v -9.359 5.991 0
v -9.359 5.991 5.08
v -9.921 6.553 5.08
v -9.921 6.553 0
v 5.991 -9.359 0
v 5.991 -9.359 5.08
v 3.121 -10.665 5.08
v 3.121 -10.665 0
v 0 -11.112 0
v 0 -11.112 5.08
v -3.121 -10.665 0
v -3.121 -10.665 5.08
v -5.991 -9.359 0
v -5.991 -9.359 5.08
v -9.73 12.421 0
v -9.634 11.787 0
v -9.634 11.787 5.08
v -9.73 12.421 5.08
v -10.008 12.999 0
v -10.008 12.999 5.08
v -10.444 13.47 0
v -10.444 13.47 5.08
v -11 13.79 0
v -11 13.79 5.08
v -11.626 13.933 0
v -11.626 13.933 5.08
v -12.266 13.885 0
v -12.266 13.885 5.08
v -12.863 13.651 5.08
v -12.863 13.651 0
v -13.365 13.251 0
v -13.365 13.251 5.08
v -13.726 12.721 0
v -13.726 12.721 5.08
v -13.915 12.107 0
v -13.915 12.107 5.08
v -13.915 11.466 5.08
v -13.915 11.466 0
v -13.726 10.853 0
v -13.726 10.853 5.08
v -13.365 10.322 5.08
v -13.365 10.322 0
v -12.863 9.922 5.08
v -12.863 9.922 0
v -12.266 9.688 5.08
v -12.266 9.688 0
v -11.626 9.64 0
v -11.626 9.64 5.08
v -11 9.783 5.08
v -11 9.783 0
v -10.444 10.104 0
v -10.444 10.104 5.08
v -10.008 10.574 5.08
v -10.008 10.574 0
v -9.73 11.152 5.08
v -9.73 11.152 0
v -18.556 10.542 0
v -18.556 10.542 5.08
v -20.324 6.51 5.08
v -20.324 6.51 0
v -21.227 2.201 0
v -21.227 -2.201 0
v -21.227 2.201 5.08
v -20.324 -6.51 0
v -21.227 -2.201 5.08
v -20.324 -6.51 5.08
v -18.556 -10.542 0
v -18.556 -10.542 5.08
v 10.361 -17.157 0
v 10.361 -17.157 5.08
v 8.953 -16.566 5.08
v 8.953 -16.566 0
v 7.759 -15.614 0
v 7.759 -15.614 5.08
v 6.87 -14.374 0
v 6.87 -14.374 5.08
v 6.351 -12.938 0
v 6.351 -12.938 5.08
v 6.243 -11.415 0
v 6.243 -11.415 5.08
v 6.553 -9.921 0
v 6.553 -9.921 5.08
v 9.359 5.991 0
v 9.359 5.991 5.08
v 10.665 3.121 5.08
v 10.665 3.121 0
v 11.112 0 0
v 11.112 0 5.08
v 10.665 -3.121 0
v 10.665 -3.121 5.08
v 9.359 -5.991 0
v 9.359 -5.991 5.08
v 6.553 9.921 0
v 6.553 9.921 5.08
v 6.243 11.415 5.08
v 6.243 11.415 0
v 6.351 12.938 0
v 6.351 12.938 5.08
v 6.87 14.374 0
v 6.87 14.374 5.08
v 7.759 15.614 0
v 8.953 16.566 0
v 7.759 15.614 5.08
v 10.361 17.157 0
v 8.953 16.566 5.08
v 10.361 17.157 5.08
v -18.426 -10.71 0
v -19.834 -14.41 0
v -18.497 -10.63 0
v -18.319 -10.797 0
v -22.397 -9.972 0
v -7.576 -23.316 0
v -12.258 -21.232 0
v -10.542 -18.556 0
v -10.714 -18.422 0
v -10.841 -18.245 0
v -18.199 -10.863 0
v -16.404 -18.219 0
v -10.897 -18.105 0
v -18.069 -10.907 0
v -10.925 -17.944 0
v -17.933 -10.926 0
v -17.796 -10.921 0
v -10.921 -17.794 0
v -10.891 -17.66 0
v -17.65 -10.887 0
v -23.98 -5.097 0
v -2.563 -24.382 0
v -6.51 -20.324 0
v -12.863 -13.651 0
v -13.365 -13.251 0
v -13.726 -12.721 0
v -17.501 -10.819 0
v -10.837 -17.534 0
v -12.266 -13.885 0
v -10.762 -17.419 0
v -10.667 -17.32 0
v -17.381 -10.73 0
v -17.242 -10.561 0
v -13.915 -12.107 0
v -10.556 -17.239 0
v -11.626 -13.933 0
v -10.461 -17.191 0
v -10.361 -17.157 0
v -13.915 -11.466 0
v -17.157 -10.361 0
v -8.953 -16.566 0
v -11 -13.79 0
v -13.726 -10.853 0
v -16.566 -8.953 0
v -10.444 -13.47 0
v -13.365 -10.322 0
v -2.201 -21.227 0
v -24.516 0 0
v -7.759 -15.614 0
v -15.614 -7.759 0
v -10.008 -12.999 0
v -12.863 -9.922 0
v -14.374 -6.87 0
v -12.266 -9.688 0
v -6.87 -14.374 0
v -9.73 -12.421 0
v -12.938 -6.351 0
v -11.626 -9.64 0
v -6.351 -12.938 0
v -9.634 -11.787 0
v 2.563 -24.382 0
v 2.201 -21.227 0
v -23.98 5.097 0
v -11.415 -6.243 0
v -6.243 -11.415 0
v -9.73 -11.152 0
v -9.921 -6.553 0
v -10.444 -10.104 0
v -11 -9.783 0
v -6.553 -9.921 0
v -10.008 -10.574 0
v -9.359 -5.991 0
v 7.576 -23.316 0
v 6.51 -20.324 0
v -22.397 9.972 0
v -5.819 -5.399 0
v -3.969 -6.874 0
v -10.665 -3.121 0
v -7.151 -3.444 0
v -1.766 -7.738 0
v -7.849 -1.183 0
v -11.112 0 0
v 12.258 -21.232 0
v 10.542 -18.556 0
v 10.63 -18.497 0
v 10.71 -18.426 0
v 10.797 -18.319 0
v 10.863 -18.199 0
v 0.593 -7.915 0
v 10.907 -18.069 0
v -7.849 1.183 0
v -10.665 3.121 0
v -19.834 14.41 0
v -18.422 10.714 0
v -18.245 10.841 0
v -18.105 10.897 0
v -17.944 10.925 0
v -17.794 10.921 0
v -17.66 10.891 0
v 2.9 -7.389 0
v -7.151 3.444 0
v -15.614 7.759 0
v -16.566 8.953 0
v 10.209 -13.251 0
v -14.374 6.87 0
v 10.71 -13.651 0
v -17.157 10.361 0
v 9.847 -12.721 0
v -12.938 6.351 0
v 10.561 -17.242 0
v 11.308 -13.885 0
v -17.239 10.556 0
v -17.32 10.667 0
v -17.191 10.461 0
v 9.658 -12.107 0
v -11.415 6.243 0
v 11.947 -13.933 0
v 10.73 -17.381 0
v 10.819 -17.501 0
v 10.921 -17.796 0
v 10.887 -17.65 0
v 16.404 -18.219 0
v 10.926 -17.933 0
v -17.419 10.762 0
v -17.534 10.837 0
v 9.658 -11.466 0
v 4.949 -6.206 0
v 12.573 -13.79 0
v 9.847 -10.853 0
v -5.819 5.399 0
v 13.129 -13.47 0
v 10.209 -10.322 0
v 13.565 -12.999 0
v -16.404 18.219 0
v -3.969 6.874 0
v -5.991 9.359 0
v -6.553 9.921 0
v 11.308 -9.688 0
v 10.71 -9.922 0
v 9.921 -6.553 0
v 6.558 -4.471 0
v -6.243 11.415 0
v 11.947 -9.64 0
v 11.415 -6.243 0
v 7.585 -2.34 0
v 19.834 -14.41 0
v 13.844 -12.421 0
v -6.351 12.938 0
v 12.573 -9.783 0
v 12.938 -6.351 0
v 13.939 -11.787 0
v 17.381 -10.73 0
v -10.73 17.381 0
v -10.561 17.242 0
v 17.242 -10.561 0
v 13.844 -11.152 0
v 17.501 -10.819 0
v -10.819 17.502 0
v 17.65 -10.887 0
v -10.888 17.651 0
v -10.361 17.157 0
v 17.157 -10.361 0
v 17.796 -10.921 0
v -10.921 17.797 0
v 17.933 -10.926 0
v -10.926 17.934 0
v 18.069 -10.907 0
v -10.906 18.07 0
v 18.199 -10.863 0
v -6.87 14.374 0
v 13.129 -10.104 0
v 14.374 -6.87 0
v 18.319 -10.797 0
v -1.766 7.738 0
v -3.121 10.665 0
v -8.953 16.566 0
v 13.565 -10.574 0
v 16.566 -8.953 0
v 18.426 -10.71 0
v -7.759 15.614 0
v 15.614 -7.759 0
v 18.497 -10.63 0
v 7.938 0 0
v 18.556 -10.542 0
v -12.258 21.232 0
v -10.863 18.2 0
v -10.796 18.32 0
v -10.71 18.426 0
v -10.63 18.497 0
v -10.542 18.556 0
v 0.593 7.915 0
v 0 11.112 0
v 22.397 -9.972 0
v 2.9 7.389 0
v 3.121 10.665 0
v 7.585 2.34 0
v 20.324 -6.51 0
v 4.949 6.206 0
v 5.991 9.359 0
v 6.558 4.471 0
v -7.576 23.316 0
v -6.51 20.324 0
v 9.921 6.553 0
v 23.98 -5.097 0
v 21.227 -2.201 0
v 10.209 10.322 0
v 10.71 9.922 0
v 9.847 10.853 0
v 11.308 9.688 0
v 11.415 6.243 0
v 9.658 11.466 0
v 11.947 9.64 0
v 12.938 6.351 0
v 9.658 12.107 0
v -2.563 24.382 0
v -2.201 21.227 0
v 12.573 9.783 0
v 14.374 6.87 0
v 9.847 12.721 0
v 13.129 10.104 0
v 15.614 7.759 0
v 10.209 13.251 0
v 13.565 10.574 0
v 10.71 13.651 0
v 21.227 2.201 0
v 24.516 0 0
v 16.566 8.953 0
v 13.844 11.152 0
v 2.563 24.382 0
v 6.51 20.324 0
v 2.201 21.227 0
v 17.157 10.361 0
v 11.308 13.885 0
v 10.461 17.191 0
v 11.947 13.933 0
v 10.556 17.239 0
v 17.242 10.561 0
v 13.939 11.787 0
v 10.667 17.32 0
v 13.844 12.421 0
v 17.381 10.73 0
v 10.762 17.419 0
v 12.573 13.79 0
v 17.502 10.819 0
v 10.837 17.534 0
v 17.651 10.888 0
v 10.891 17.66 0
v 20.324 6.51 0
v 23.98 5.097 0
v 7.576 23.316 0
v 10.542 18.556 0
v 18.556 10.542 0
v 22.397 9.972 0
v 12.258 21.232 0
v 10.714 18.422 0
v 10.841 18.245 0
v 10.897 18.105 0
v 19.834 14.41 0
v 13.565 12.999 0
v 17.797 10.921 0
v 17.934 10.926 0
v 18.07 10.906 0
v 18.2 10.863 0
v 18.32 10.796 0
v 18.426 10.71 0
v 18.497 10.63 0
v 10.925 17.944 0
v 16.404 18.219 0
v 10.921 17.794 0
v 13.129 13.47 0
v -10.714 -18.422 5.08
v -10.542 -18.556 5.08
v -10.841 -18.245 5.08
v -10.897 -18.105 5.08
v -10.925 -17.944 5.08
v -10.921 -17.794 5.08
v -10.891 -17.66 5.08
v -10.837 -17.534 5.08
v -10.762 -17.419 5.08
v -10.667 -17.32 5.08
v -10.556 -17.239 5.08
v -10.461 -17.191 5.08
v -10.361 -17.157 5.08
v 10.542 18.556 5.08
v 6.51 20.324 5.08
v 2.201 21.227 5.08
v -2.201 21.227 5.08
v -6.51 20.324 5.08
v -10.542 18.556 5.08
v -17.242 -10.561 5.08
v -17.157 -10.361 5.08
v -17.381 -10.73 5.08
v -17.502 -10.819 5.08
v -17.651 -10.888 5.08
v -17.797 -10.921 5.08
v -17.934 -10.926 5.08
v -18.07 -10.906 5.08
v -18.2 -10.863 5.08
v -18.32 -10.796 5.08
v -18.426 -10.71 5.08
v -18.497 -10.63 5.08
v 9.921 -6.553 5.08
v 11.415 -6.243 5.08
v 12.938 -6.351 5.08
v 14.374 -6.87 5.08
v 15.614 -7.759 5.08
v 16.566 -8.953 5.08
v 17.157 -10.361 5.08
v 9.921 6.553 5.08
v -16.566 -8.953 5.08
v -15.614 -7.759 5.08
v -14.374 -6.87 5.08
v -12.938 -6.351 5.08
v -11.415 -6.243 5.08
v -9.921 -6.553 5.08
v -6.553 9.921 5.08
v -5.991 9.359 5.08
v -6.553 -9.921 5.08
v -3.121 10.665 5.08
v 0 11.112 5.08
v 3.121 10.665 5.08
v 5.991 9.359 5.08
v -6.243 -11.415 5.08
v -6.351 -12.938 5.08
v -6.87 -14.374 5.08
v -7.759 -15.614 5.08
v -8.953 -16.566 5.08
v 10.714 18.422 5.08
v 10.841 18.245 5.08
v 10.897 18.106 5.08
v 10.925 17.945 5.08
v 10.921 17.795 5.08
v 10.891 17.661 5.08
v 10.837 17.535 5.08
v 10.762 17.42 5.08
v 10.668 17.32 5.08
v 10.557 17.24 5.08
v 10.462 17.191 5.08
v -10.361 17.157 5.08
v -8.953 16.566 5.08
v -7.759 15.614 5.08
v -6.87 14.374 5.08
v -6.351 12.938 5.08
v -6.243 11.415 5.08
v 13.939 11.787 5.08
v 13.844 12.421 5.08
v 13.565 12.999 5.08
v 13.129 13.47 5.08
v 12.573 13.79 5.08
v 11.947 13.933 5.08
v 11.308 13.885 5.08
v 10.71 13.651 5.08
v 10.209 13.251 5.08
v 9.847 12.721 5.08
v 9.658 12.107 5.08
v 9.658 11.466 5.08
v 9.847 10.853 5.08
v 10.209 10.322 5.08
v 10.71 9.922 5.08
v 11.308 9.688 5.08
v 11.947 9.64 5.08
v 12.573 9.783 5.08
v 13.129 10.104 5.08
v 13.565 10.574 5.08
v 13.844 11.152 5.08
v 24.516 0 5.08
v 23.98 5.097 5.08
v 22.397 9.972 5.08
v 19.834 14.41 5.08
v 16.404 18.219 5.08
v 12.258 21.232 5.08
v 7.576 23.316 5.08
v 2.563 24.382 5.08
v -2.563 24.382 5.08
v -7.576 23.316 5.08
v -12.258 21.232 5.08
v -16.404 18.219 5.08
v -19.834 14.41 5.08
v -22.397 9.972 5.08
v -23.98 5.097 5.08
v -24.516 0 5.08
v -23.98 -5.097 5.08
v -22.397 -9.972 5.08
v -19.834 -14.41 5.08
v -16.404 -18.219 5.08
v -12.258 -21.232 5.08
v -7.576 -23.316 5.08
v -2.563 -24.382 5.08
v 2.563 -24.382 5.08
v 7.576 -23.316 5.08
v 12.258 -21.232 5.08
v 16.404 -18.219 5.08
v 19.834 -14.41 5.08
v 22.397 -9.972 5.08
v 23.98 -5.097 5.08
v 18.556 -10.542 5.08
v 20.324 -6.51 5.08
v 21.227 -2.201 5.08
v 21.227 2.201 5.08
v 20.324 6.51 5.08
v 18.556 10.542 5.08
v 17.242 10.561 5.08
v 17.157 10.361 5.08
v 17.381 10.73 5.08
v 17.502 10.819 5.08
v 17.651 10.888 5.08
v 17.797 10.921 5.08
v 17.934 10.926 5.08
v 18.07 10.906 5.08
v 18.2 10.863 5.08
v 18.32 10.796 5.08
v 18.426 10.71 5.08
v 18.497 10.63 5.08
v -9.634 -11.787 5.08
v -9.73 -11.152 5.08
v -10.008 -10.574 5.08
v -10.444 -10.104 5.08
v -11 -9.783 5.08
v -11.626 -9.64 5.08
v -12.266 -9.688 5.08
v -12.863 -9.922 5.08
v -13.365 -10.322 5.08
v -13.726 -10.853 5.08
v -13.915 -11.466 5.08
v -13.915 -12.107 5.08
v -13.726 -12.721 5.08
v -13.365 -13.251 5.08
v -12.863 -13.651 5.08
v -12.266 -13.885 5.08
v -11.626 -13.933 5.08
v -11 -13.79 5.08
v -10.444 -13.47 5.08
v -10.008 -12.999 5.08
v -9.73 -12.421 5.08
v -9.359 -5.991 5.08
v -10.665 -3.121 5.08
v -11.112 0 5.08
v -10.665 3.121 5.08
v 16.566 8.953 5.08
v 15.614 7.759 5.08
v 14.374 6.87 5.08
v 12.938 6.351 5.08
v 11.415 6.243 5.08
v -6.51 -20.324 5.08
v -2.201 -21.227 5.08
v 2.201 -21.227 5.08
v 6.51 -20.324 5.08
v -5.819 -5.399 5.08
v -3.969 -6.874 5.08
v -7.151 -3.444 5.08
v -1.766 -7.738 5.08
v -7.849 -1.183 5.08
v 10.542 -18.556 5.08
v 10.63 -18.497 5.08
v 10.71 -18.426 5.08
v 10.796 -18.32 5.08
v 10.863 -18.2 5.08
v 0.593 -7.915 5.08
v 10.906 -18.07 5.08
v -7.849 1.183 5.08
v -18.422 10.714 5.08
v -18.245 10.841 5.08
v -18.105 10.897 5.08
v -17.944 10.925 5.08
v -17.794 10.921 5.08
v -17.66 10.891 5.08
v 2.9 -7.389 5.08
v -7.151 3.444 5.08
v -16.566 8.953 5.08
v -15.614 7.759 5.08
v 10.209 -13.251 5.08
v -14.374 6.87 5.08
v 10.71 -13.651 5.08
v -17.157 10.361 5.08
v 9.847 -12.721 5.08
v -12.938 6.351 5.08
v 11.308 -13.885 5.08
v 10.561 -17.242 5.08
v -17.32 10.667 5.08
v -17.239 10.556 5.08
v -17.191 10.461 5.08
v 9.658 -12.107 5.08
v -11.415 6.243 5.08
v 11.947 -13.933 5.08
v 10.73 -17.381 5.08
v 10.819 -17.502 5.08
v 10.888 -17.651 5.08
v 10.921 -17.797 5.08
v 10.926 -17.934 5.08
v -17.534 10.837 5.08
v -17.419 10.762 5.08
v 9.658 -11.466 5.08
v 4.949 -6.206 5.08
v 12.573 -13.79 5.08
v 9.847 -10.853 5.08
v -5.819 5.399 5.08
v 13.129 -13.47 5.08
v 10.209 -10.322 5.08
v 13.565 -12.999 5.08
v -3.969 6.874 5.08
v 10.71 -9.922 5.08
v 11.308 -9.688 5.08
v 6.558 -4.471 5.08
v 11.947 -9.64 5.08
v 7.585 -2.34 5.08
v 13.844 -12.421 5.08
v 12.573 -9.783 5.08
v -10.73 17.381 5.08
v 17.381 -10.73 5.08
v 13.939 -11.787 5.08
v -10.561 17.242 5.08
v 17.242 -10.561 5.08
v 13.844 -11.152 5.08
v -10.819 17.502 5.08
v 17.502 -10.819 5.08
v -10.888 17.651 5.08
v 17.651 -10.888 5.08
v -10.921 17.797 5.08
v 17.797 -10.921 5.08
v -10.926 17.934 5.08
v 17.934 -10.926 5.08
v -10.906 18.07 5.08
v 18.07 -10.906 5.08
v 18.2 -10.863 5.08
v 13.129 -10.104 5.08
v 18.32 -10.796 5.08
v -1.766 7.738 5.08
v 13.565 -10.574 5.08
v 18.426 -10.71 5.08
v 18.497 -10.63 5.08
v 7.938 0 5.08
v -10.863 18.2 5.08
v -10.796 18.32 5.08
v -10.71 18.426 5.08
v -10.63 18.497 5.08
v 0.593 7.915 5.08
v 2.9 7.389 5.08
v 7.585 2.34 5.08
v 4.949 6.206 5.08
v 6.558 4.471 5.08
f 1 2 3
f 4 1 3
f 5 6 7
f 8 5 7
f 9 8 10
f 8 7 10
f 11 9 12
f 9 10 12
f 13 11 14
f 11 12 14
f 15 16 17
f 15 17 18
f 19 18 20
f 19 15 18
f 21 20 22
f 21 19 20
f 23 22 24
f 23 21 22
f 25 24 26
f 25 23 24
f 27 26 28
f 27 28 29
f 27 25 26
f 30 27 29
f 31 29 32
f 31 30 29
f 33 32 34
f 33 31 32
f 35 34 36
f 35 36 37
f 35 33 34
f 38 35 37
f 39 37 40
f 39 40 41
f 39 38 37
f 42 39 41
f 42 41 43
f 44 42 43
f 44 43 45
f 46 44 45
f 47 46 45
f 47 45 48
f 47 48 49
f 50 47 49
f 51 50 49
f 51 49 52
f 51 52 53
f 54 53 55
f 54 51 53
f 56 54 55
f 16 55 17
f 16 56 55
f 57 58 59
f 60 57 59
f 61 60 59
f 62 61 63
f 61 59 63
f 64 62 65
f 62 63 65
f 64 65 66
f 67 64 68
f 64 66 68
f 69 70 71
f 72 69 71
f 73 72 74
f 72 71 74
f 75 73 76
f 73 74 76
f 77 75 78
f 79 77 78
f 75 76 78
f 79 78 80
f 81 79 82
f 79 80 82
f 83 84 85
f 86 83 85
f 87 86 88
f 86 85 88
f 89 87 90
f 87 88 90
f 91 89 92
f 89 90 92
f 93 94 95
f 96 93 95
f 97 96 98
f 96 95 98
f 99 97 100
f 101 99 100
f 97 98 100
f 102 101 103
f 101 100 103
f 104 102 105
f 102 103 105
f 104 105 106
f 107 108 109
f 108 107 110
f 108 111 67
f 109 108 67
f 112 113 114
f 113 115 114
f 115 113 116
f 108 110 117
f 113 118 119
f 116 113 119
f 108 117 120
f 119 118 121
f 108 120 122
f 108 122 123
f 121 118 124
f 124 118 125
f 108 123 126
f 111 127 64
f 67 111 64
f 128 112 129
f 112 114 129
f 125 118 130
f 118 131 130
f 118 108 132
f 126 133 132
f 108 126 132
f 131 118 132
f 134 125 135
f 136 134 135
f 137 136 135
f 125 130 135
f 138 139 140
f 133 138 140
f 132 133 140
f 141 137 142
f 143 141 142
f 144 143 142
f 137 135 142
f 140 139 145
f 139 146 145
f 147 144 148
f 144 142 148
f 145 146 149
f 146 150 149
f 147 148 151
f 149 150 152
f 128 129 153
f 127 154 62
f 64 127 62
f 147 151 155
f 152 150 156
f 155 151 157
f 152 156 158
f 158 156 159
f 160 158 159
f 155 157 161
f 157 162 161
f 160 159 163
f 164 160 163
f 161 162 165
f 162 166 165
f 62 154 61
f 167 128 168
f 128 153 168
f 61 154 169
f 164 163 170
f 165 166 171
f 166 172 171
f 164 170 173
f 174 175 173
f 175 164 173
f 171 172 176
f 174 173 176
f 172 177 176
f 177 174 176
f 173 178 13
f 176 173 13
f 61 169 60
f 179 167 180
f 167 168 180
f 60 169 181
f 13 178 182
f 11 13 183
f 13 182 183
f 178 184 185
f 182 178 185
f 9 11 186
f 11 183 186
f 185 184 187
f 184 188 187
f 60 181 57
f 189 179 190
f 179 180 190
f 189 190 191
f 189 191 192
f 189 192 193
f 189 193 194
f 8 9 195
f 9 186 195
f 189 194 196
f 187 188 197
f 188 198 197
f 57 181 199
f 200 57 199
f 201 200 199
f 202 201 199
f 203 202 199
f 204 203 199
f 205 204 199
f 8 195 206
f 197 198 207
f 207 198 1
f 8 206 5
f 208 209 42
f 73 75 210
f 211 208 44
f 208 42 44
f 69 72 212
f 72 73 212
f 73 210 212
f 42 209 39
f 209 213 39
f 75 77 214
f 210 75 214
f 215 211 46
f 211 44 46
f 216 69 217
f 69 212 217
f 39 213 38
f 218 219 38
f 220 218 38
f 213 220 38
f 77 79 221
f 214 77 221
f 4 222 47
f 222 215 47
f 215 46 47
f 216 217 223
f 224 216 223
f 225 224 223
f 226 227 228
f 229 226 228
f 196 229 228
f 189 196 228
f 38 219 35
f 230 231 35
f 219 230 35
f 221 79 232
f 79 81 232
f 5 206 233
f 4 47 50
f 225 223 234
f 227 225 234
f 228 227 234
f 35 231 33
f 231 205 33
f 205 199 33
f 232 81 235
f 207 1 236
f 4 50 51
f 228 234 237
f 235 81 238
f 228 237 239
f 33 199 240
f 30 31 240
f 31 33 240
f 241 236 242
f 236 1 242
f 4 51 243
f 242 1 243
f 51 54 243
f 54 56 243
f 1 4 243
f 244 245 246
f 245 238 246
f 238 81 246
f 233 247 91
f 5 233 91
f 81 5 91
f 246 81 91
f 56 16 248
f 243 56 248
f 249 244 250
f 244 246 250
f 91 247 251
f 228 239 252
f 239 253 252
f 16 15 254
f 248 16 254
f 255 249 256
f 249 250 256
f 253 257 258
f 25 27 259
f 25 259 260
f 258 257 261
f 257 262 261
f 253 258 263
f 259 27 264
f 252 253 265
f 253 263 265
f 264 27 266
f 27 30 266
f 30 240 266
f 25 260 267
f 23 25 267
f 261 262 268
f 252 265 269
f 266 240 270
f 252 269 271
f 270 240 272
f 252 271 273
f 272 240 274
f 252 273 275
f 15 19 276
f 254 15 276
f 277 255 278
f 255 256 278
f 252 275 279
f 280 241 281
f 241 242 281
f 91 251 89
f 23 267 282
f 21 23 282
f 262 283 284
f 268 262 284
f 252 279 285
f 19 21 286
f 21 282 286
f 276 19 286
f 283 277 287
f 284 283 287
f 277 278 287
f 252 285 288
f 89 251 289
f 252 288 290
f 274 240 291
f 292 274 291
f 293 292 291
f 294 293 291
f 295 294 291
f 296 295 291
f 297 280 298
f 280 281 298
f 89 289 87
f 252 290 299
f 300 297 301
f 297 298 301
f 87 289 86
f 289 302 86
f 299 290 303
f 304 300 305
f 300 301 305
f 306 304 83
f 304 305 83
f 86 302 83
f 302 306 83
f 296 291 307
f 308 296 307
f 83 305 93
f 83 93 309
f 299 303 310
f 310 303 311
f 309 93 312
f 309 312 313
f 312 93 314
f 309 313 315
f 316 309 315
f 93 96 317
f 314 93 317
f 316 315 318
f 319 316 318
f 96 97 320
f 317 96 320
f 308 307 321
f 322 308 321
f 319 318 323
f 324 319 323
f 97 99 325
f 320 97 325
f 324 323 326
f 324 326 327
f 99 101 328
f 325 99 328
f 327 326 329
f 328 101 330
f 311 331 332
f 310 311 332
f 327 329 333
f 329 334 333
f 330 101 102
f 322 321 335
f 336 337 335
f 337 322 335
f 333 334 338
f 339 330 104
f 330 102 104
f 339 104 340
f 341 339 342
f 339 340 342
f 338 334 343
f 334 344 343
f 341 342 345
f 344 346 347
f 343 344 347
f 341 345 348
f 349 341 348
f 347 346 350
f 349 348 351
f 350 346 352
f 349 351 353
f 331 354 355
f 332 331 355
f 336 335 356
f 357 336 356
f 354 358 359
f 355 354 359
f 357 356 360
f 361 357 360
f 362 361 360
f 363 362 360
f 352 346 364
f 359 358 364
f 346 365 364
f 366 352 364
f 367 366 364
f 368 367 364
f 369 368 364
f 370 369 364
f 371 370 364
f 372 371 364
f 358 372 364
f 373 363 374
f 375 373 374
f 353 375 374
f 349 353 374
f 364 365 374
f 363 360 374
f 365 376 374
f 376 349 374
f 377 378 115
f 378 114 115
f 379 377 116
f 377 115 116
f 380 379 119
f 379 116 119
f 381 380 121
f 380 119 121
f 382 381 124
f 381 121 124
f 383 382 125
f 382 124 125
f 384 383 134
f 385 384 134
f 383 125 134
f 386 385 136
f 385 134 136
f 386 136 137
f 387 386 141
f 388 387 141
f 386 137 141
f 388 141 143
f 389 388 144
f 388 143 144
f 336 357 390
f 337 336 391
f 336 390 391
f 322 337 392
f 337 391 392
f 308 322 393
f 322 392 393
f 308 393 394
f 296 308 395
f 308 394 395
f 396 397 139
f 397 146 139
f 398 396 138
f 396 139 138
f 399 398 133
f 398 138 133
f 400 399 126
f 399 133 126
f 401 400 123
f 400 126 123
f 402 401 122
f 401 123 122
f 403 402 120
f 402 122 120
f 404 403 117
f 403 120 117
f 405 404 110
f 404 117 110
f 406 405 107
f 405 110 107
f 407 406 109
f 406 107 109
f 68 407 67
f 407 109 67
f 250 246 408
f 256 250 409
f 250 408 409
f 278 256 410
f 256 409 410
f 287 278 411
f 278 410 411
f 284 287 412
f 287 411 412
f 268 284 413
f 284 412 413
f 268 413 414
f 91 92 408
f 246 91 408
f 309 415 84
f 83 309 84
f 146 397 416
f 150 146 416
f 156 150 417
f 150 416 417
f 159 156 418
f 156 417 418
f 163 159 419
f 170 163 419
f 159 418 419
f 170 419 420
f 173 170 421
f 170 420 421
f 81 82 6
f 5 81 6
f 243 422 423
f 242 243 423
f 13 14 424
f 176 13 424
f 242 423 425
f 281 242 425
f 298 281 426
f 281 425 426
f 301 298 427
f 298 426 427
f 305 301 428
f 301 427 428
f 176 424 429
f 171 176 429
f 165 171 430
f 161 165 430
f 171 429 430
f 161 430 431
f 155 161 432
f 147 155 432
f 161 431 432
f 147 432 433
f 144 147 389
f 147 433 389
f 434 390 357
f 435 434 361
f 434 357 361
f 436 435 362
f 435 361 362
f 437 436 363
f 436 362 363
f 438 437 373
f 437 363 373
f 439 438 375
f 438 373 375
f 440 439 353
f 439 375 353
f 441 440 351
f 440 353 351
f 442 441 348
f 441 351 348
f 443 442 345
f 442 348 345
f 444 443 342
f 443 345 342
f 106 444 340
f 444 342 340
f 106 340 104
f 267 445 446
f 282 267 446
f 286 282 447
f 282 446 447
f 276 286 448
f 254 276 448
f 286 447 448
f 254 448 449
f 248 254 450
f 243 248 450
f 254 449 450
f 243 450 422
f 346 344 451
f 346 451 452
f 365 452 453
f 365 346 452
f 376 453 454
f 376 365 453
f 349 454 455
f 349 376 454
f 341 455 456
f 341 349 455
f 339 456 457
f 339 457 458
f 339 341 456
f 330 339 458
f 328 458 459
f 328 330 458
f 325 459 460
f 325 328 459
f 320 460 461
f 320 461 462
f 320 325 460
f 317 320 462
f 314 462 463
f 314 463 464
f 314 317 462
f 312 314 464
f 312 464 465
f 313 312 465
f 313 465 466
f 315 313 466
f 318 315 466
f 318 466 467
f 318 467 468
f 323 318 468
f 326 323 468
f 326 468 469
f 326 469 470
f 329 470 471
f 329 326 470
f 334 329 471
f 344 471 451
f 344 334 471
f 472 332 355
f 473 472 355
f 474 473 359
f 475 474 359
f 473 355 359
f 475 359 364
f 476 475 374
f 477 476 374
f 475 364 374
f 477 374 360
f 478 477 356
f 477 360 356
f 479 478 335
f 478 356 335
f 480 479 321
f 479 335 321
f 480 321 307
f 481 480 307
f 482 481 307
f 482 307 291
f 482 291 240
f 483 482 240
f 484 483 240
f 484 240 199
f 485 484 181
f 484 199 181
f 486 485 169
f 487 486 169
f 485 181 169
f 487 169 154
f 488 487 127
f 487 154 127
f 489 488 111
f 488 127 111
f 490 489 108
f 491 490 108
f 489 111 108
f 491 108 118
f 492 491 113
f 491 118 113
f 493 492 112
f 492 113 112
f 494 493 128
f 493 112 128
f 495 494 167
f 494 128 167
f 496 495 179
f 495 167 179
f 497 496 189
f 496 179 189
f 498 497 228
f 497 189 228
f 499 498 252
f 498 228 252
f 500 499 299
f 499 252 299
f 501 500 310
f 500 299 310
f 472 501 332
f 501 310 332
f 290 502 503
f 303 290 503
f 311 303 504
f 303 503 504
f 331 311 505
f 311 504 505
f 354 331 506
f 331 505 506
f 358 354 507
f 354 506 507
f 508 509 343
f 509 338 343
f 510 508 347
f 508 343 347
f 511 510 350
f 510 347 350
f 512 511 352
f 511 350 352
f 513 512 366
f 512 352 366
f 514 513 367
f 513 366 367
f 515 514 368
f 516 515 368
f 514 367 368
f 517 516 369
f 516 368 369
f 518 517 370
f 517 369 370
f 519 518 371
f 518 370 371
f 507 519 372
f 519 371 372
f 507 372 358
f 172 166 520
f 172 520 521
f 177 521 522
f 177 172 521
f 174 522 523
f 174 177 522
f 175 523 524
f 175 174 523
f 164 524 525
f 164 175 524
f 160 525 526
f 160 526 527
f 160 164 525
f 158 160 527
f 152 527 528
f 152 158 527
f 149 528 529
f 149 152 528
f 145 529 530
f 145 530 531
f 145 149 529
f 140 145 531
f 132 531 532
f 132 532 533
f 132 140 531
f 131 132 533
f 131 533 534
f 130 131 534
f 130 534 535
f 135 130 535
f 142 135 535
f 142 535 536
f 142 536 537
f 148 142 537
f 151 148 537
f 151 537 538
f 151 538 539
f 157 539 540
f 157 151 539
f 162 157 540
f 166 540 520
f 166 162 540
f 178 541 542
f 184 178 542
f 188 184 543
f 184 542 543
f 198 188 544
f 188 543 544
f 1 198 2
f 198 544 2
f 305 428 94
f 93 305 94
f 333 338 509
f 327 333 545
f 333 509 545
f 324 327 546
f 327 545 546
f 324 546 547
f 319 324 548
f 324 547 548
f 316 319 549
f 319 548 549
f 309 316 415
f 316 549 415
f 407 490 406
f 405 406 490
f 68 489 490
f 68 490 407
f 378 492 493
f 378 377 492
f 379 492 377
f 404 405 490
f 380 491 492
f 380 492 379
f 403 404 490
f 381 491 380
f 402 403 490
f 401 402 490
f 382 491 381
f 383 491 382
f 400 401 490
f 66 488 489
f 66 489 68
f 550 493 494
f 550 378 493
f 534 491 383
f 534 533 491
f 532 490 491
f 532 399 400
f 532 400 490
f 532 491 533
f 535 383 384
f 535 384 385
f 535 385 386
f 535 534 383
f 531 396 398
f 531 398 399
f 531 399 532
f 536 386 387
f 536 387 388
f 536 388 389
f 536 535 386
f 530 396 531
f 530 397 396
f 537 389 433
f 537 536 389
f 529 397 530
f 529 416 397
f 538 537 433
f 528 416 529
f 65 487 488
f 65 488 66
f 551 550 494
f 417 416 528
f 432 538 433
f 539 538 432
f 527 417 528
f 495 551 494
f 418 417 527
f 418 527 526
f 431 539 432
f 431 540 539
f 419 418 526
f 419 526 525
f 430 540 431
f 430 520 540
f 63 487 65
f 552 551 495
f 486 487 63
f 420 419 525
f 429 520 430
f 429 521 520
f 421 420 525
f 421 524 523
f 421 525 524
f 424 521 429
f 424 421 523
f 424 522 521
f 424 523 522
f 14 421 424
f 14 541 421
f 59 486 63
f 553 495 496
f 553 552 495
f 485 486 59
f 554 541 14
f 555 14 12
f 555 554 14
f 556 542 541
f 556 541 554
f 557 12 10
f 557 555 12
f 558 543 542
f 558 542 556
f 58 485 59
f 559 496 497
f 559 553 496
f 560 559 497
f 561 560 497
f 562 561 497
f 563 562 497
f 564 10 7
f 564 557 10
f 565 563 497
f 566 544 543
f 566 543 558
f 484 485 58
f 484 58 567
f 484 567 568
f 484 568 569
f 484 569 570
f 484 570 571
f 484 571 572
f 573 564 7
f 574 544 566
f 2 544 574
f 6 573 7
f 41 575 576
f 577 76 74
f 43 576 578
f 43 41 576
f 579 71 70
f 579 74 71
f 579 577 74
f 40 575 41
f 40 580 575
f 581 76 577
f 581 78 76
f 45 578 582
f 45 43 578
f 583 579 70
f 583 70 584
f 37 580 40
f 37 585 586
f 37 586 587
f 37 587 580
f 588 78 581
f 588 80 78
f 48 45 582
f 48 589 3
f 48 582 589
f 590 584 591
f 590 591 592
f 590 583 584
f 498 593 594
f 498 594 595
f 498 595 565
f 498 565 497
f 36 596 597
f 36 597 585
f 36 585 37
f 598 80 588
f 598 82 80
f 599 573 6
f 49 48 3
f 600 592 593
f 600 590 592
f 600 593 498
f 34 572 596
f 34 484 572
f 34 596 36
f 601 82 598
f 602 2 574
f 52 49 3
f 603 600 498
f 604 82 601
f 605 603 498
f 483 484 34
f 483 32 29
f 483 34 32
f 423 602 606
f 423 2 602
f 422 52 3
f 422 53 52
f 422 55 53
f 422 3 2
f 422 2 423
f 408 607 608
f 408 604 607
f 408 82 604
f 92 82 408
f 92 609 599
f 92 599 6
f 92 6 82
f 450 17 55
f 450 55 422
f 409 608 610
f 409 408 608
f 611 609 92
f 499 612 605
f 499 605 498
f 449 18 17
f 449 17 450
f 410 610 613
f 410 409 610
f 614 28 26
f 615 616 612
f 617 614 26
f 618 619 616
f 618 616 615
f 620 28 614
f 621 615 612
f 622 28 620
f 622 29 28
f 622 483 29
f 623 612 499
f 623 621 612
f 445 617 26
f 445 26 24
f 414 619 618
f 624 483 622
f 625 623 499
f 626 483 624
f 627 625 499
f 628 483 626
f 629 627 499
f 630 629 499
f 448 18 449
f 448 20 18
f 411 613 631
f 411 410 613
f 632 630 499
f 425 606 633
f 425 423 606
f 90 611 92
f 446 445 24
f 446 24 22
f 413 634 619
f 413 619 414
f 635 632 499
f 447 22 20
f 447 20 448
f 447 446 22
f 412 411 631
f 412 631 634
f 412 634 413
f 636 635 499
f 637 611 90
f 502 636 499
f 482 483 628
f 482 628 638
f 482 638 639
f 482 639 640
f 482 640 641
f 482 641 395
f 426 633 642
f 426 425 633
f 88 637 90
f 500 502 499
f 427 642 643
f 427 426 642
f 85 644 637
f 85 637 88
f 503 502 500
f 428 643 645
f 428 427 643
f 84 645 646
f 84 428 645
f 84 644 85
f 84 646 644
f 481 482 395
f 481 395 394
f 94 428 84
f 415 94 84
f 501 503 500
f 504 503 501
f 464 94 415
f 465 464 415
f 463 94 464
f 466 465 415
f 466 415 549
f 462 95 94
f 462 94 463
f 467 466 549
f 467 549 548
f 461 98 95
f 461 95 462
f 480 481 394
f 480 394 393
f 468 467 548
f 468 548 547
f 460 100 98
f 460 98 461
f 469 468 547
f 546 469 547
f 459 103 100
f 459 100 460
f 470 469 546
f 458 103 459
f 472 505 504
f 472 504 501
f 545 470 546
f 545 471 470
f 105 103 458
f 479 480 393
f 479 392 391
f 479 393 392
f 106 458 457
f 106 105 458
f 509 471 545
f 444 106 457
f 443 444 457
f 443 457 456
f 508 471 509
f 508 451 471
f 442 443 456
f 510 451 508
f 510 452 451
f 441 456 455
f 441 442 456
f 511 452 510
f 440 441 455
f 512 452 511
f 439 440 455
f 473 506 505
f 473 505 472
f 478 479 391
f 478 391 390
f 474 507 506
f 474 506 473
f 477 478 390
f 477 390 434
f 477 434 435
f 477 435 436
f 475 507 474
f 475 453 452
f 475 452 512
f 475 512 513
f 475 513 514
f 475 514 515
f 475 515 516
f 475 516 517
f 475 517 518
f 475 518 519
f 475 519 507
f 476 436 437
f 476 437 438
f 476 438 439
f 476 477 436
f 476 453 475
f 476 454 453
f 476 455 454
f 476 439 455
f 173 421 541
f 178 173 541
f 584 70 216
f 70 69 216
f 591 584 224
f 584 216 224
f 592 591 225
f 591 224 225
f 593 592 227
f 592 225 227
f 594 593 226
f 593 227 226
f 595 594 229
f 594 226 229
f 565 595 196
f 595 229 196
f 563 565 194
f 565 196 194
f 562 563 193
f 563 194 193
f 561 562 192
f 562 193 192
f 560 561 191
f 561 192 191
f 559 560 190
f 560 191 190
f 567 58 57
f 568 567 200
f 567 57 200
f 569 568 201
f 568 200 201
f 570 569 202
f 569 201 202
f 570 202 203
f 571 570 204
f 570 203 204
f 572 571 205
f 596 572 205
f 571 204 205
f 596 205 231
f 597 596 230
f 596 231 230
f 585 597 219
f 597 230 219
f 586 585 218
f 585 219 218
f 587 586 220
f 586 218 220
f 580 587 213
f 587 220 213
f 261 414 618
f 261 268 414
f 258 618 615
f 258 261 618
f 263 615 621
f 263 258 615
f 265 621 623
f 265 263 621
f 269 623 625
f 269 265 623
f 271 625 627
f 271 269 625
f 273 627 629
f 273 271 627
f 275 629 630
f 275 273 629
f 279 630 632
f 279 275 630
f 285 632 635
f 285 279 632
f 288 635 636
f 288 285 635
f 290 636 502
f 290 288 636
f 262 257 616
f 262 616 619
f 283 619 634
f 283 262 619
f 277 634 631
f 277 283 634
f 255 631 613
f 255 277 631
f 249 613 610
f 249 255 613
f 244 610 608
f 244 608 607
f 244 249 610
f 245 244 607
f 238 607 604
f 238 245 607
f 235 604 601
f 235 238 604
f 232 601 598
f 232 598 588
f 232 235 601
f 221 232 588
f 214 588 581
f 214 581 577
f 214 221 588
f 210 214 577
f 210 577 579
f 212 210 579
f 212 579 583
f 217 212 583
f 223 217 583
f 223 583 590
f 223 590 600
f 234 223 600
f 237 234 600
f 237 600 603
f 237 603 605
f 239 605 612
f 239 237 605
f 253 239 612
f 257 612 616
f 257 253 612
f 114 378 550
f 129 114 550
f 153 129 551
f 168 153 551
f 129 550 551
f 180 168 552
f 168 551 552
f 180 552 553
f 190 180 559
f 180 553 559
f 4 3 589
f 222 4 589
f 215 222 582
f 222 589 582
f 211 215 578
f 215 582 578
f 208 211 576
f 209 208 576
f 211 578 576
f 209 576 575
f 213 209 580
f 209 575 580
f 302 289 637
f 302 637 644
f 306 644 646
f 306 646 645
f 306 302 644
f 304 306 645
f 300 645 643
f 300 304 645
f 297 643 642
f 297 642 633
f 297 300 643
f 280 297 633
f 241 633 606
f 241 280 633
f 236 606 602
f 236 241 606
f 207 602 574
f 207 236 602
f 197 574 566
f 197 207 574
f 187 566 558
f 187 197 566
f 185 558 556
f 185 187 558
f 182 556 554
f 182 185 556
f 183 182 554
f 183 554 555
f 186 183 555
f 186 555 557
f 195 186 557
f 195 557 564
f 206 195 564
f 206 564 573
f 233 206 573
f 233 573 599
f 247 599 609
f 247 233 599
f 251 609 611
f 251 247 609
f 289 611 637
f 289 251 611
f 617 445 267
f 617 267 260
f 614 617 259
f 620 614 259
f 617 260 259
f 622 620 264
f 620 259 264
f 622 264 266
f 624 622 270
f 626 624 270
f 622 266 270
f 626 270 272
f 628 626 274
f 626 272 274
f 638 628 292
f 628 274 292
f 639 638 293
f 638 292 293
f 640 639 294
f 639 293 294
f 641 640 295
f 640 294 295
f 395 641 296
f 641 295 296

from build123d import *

# Parameters (mm, degrees)
F0_R            = 24.51608
F0_R_2          = 2.15265
F0_R_3          = 7.9375
F1_DEPTH        = 5.08
F3_DEPTH        = 5.08
F3_COPIES_COUNT = 4
F4_R            = 0.762


# Not quite as in the source:
# - a pattern or mirror of a feature is missing from the dataset's text; its kind, count and spacing are read off the source's solid


with BuildPart() as f1:
    # F0 (on Top) → F1 (new body)
    with BuildSketch(Plane.XY):
        Circle(F0_R)
        with Locations((-11.7865906, -11.7865906)):
            Circle(F0_R_2, mode=Mode.SUBTRACT)
        with Locations((11.7865906, -11.7865906)):
            Circle(F0_R_2, mode=Mode.SUBTRACT)
        with Locations((-11.7865906, 11.7865906)):
            Circle(F0_R_2, mode=Mode.SUBTRACT)
        Circle(F0_R_3, mode=Mode.SUBTRACT)
        with Locations((11.7865906, 11.7865906)):
            Circle(F0_R_2, mode=Mode.SUBTRACT)
    extrude(amount=F1_DEPTH)

    # F2 (on face) → F3 (cut, through all)
    with BuildSketch(Plane.XY.offset(5.08)):
        with BuildLine():
            ThreePointArc((-12.5005198818, 17.2967828873), (-7.4612395718, 15.2741760893), (-6.553034663, 9.9206307084))
            Line((-6.553034663, 9.9206307084), (-5.9913991959, 9.3589952413))
            ThreePointArc((-5.9913991959, 9.3589952413), (0, 11.1125), (5.9913991959, 9.3589952413))
            Line((5.9913991959, 9.3589952413), (6.553034663, 9.9206307084))
            ThreePointArc((6.553034663, 9.9206307084), (7.4612395718, 15.2741760893), (12.5005198818, 17.2967828873))
            ThreePointArc((12.5005198818, 17.2967828873), (0, 21.34108), (-12.5005198818, 17.2967828873))
        make_face()
    f3 = extrude(amount=-F3_DEPTH, mode=Mode.SUBTRACT)

    # F3_copies: F3 ×4 about axis
    f3_copies_axis = Axis((0, 0, 0), (0, 0, 1))
    for i in range(1, F3_COPIES_COUNT):
        add(f3.rotate(f3_copies_axis, i * 360 / F3_COPIES_COUNT), mode=Mode.SUBTRACT)

    # F4
    f4_edges = [f1.edges().sort_by_distance(p)[0] for p in [
        (-12.50052, 17.296783, 2.54),
        (12.50052, 17.296783, 2.54),
        (-17.296783, -12.50052, 2.54),
        (-17.296783, 12.50052, 2.54),
        (12.50052, -17.296783, 2.54),
        (-12.50052, -17.296783, 2.54),
        (17.296783, 12.50052, 2.54),
        (17.296783, -12.50052, 2.54),
    ]]
    fillet(f4_edges, radius=F4_R)


solid = f1.part
